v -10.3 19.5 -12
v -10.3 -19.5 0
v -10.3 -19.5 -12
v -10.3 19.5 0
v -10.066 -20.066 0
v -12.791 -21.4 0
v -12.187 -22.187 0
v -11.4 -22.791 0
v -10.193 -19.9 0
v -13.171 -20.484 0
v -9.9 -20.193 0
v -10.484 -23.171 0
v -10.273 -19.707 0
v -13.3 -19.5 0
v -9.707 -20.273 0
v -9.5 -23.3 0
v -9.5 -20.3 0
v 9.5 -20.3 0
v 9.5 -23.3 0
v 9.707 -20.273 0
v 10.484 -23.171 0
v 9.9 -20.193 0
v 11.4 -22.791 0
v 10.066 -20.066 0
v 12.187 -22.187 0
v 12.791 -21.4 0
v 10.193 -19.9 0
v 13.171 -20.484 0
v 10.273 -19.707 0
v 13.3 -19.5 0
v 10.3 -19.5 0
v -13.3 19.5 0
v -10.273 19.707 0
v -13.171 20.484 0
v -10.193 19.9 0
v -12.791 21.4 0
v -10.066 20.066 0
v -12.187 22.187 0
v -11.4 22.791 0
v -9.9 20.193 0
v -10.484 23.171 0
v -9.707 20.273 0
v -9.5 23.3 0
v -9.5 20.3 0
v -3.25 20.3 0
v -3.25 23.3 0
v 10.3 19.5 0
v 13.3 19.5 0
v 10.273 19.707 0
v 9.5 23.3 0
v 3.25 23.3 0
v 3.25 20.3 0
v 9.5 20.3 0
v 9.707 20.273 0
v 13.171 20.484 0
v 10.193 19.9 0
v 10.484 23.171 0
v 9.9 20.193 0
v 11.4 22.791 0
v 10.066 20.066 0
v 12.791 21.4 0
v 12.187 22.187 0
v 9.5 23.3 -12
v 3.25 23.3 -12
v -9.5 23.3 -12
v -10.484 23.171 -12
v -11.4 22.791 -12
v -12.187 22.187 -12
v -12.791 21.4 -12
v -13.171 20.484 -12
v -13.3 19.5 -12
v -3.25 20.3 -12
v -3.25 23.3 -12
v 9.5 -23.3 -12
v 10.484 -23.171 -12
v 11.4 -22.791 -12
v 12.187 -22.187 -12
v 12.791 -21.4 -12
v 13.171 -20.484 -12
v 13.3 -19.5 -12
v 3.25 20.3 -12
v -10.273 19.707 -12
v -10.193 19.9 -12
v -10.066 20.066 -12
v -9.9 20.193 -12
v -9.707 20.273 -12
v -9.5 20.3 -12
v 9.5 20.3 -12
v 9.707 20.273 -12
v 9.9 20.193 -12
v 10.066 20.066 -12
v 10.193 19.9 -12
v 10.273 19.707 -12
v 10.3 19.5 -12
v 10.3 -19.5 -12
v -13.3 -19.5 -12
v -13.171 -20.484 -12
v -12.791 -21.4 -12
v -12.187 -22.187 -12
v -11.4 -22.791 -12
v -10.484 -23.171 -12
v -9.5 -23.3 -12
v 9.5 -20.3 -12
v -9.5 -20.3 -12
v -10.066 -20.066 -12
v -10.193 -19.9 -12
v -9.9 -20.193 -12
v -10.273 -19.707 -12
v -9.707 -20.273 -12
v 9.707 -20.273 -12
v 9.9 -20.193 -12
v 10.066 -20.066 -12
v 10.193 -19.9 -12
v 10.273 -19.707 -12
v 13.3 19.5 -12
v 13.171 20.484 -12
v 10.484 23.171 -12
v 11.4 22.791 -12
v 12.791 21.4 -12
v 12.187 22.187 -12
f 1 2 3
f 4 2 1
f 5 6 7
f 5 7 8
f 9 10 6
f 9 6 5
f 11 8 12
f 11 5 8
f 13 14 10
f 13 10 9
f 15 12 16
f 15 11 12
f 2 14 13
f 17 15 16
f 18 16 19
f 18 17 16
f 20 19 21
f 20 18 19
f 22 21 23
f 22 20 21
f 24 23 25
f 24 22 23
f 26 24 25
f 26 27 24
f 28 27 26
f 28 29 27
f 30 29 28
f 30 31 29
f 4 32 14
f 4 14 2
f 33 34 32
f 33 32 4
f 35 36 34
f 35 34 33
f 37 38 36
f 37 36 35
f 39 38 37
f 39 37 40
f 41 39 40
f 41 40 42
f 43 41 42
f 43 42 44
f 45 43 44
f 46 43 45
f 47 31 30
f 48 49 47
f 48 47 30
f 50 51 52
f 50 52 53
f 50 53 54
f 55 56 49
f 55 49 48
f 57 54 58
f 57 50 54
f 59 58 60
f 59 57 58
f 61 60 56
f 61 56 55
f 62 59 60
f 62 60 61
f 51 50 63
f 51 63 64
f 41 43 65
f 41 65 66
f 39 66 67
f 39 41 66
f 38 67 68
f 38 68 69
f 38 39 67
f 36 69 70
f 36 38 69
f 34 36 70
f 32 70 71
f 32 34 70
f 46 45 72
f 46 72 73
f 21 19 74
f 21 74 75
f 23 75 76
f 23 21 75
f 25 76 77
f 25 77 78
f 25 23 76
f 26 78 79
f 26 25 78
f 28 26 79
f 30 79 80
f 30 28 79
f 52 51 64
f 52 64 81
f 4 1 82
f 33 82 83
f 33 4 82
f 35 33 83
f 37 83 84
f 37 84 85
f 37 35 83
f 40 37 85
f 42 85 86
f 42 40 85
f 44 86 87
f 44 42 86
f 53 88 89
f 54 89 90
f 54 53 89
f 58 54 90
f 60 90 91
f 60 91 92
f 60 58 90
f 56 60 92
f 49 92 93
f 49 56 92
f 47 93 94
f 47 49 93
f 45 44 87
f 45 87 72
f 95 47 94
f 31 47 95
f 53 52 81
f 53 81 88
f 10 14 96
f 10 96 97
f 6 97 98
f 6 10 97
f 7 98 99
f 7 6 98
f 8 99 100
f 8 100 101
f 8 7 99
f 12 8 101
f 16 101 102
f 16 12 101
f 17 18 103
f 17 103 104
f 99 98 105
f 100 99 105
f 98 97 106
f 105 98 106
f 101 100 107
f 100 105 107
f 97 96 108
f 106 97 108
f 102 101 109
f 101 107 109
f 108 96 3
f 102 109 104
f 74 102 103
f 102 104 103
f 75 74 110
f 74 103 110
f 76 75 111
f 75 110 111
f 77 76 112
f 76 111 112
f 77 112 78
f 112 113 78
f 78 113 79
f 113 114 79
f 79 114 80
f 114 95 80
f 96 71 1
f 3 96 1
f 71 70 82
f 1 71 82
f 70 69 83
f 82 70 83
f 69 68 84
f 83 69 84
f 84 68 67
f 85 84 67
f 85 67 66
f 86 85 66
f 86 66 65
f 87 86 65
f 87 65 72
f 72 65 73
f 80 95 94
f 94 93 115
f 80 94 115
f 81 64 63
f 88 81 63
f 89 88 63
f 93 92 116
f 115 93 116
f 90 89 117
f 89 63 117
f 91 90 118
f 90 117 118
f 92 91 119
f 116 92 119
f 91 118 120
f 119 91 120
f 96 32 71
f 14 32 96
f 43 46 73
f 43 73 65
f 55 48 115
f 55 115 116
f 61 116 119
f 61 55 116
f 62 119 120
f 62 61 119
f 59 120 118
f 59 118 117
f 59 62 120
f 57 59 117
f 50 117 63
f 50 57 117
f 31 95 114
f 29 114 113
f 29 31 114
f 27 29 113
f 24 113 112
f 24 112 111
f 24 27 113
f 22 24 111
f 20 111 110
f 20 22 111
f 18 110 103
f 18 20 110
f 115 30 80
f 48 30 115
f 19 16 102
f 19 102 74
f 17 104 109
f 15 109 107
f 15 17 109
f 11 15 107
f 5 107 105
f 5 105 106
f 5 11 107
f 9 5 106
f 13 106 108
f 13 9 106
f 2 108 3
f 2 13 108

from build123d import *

# Parameters (mm, degrees)
BOSS_EXTRUDE1_DEPTH = 12


with BuildPart() as part:
    # Sketch1 → Boss-Extrude1 (new body)
    with BuildSketch(Plane.XY):
        with BuildLine():
            Line((-4.455735931, 20.3), (-3.25, 20.3))
            Line((-3.25, 20.3), (-3.25, 23.3))
            Line((-3.25, 23.3), (-4.455735931, 23.3))
            Line((-4.455735931, 23.3), (-9.5, 23.3))
            ThreePointArc((-9.5, 23.3), (-12.187005769, 22.187005769), (-13.3, 19.5))
            Line((-13.3, 19.5), (-13.3, 14.455735931))
            Line((-13.3, 14.455735931), (-13.3, 5.544264069))
            Line((-13.3, 5.544264069), (-13.3, -5.544264069))
            Line((-13.3, -5.544264069), (-13.3, -14.455735931))
            Line((-13.3, -14.455735931), (-13.3, -19.5))
            ThreePointArc((-13.3, -19.5), (-12.187005769, -22.187005769), (-9.5, -23.3))
            Line((-9.5, -23.3), (-4.455735931, -23.3))
            Line((-4.455735931, -23.3), (4.455735931, -23.3))
            Line((4.455735931, -23.3), (9.5, -23.3))
            ThreePointArc((9.5, -23.3), (12.187005769, -22.187005769), (13.3, -19.5))
            Line((13.3, -19.5), (13.3, -14.455735931))
            Line((13.3, -14.455735931), (13.3, -5.544264069))
            Line((13.3, -5.544264069), (13.3, 5.544264069))
            Line((13.3, 5.544264069), (13.3, 14.455735931))
            Line((13.3, 14.455735931), (13.3, 19.5))
            ThreePointArc((13.3, 19.5), (12.187005769, 22.187005769), (9.5, 23.3))
            Line((9.5, 23.3), (4.455735931, 23.3))
            Line((4.455735931, 23.3), (3.25, 23.3))
            Line((3.25, 23.3), (3.25, 20.3))
            Line((3.25, 20.3), (4.455735931, 20.3))
            Line((4.455735931, 20.3), (9.5, 20.3))
            ThreePointArc((9.5, 20.3), (10.065685425, 20.065685425), (10.3, 19.5))
            Line((10.3, 19.5), (10.3, 14.455735931))
            Line((10.3, 14.455735931), (10.3, 5.544264069))
            Line((10.3, 5.544264069), (10.3, -5.544264069))
            Line((10.3, -5.544264069), (10.3, -14.455735931))
            Line((10.3, -14.455735931), (10.3, -19.5))
            ThreePointArc((10.3, -19.5), (10.065685425, -20.065685425), (9.5, -20.3))
            Line((9.5, -20.3), (4.455735931, -20.3))
            Line((4.455735931, -20.3), (-4.455735931, -20.3))
            Line((-4.455735931, -20.3), (-9.5, -20.3))
            ThreePointArc((-9.5, -20.3), (-10.065685425, -20.065685425), (-10.3, -19.5))
            Line((-10.3, -19.5), (-10.3, -14.455735931))
            Line((-10.3, -14.455735931), (-10.3, -5.544264069))
            Line((-10.3, -5.544264069), (-10.3, 5.544264069))
            Line((-10.3, 5.544264069), (-10.3, 14.455735931))
            Line((-10.3, 14.455735931), (-10.3, 19.5))
            ThreePointArc((-10.3, 19.5), (-10.065685425, 20.065685425), (-9.5, 20.3))
            Line((-9.5, 20.3), (-4.455735931, 20.3))
        make_face()
    extrude(amount=-BOSS_EXTRUDE1_DEPTH)


solid = part.part
